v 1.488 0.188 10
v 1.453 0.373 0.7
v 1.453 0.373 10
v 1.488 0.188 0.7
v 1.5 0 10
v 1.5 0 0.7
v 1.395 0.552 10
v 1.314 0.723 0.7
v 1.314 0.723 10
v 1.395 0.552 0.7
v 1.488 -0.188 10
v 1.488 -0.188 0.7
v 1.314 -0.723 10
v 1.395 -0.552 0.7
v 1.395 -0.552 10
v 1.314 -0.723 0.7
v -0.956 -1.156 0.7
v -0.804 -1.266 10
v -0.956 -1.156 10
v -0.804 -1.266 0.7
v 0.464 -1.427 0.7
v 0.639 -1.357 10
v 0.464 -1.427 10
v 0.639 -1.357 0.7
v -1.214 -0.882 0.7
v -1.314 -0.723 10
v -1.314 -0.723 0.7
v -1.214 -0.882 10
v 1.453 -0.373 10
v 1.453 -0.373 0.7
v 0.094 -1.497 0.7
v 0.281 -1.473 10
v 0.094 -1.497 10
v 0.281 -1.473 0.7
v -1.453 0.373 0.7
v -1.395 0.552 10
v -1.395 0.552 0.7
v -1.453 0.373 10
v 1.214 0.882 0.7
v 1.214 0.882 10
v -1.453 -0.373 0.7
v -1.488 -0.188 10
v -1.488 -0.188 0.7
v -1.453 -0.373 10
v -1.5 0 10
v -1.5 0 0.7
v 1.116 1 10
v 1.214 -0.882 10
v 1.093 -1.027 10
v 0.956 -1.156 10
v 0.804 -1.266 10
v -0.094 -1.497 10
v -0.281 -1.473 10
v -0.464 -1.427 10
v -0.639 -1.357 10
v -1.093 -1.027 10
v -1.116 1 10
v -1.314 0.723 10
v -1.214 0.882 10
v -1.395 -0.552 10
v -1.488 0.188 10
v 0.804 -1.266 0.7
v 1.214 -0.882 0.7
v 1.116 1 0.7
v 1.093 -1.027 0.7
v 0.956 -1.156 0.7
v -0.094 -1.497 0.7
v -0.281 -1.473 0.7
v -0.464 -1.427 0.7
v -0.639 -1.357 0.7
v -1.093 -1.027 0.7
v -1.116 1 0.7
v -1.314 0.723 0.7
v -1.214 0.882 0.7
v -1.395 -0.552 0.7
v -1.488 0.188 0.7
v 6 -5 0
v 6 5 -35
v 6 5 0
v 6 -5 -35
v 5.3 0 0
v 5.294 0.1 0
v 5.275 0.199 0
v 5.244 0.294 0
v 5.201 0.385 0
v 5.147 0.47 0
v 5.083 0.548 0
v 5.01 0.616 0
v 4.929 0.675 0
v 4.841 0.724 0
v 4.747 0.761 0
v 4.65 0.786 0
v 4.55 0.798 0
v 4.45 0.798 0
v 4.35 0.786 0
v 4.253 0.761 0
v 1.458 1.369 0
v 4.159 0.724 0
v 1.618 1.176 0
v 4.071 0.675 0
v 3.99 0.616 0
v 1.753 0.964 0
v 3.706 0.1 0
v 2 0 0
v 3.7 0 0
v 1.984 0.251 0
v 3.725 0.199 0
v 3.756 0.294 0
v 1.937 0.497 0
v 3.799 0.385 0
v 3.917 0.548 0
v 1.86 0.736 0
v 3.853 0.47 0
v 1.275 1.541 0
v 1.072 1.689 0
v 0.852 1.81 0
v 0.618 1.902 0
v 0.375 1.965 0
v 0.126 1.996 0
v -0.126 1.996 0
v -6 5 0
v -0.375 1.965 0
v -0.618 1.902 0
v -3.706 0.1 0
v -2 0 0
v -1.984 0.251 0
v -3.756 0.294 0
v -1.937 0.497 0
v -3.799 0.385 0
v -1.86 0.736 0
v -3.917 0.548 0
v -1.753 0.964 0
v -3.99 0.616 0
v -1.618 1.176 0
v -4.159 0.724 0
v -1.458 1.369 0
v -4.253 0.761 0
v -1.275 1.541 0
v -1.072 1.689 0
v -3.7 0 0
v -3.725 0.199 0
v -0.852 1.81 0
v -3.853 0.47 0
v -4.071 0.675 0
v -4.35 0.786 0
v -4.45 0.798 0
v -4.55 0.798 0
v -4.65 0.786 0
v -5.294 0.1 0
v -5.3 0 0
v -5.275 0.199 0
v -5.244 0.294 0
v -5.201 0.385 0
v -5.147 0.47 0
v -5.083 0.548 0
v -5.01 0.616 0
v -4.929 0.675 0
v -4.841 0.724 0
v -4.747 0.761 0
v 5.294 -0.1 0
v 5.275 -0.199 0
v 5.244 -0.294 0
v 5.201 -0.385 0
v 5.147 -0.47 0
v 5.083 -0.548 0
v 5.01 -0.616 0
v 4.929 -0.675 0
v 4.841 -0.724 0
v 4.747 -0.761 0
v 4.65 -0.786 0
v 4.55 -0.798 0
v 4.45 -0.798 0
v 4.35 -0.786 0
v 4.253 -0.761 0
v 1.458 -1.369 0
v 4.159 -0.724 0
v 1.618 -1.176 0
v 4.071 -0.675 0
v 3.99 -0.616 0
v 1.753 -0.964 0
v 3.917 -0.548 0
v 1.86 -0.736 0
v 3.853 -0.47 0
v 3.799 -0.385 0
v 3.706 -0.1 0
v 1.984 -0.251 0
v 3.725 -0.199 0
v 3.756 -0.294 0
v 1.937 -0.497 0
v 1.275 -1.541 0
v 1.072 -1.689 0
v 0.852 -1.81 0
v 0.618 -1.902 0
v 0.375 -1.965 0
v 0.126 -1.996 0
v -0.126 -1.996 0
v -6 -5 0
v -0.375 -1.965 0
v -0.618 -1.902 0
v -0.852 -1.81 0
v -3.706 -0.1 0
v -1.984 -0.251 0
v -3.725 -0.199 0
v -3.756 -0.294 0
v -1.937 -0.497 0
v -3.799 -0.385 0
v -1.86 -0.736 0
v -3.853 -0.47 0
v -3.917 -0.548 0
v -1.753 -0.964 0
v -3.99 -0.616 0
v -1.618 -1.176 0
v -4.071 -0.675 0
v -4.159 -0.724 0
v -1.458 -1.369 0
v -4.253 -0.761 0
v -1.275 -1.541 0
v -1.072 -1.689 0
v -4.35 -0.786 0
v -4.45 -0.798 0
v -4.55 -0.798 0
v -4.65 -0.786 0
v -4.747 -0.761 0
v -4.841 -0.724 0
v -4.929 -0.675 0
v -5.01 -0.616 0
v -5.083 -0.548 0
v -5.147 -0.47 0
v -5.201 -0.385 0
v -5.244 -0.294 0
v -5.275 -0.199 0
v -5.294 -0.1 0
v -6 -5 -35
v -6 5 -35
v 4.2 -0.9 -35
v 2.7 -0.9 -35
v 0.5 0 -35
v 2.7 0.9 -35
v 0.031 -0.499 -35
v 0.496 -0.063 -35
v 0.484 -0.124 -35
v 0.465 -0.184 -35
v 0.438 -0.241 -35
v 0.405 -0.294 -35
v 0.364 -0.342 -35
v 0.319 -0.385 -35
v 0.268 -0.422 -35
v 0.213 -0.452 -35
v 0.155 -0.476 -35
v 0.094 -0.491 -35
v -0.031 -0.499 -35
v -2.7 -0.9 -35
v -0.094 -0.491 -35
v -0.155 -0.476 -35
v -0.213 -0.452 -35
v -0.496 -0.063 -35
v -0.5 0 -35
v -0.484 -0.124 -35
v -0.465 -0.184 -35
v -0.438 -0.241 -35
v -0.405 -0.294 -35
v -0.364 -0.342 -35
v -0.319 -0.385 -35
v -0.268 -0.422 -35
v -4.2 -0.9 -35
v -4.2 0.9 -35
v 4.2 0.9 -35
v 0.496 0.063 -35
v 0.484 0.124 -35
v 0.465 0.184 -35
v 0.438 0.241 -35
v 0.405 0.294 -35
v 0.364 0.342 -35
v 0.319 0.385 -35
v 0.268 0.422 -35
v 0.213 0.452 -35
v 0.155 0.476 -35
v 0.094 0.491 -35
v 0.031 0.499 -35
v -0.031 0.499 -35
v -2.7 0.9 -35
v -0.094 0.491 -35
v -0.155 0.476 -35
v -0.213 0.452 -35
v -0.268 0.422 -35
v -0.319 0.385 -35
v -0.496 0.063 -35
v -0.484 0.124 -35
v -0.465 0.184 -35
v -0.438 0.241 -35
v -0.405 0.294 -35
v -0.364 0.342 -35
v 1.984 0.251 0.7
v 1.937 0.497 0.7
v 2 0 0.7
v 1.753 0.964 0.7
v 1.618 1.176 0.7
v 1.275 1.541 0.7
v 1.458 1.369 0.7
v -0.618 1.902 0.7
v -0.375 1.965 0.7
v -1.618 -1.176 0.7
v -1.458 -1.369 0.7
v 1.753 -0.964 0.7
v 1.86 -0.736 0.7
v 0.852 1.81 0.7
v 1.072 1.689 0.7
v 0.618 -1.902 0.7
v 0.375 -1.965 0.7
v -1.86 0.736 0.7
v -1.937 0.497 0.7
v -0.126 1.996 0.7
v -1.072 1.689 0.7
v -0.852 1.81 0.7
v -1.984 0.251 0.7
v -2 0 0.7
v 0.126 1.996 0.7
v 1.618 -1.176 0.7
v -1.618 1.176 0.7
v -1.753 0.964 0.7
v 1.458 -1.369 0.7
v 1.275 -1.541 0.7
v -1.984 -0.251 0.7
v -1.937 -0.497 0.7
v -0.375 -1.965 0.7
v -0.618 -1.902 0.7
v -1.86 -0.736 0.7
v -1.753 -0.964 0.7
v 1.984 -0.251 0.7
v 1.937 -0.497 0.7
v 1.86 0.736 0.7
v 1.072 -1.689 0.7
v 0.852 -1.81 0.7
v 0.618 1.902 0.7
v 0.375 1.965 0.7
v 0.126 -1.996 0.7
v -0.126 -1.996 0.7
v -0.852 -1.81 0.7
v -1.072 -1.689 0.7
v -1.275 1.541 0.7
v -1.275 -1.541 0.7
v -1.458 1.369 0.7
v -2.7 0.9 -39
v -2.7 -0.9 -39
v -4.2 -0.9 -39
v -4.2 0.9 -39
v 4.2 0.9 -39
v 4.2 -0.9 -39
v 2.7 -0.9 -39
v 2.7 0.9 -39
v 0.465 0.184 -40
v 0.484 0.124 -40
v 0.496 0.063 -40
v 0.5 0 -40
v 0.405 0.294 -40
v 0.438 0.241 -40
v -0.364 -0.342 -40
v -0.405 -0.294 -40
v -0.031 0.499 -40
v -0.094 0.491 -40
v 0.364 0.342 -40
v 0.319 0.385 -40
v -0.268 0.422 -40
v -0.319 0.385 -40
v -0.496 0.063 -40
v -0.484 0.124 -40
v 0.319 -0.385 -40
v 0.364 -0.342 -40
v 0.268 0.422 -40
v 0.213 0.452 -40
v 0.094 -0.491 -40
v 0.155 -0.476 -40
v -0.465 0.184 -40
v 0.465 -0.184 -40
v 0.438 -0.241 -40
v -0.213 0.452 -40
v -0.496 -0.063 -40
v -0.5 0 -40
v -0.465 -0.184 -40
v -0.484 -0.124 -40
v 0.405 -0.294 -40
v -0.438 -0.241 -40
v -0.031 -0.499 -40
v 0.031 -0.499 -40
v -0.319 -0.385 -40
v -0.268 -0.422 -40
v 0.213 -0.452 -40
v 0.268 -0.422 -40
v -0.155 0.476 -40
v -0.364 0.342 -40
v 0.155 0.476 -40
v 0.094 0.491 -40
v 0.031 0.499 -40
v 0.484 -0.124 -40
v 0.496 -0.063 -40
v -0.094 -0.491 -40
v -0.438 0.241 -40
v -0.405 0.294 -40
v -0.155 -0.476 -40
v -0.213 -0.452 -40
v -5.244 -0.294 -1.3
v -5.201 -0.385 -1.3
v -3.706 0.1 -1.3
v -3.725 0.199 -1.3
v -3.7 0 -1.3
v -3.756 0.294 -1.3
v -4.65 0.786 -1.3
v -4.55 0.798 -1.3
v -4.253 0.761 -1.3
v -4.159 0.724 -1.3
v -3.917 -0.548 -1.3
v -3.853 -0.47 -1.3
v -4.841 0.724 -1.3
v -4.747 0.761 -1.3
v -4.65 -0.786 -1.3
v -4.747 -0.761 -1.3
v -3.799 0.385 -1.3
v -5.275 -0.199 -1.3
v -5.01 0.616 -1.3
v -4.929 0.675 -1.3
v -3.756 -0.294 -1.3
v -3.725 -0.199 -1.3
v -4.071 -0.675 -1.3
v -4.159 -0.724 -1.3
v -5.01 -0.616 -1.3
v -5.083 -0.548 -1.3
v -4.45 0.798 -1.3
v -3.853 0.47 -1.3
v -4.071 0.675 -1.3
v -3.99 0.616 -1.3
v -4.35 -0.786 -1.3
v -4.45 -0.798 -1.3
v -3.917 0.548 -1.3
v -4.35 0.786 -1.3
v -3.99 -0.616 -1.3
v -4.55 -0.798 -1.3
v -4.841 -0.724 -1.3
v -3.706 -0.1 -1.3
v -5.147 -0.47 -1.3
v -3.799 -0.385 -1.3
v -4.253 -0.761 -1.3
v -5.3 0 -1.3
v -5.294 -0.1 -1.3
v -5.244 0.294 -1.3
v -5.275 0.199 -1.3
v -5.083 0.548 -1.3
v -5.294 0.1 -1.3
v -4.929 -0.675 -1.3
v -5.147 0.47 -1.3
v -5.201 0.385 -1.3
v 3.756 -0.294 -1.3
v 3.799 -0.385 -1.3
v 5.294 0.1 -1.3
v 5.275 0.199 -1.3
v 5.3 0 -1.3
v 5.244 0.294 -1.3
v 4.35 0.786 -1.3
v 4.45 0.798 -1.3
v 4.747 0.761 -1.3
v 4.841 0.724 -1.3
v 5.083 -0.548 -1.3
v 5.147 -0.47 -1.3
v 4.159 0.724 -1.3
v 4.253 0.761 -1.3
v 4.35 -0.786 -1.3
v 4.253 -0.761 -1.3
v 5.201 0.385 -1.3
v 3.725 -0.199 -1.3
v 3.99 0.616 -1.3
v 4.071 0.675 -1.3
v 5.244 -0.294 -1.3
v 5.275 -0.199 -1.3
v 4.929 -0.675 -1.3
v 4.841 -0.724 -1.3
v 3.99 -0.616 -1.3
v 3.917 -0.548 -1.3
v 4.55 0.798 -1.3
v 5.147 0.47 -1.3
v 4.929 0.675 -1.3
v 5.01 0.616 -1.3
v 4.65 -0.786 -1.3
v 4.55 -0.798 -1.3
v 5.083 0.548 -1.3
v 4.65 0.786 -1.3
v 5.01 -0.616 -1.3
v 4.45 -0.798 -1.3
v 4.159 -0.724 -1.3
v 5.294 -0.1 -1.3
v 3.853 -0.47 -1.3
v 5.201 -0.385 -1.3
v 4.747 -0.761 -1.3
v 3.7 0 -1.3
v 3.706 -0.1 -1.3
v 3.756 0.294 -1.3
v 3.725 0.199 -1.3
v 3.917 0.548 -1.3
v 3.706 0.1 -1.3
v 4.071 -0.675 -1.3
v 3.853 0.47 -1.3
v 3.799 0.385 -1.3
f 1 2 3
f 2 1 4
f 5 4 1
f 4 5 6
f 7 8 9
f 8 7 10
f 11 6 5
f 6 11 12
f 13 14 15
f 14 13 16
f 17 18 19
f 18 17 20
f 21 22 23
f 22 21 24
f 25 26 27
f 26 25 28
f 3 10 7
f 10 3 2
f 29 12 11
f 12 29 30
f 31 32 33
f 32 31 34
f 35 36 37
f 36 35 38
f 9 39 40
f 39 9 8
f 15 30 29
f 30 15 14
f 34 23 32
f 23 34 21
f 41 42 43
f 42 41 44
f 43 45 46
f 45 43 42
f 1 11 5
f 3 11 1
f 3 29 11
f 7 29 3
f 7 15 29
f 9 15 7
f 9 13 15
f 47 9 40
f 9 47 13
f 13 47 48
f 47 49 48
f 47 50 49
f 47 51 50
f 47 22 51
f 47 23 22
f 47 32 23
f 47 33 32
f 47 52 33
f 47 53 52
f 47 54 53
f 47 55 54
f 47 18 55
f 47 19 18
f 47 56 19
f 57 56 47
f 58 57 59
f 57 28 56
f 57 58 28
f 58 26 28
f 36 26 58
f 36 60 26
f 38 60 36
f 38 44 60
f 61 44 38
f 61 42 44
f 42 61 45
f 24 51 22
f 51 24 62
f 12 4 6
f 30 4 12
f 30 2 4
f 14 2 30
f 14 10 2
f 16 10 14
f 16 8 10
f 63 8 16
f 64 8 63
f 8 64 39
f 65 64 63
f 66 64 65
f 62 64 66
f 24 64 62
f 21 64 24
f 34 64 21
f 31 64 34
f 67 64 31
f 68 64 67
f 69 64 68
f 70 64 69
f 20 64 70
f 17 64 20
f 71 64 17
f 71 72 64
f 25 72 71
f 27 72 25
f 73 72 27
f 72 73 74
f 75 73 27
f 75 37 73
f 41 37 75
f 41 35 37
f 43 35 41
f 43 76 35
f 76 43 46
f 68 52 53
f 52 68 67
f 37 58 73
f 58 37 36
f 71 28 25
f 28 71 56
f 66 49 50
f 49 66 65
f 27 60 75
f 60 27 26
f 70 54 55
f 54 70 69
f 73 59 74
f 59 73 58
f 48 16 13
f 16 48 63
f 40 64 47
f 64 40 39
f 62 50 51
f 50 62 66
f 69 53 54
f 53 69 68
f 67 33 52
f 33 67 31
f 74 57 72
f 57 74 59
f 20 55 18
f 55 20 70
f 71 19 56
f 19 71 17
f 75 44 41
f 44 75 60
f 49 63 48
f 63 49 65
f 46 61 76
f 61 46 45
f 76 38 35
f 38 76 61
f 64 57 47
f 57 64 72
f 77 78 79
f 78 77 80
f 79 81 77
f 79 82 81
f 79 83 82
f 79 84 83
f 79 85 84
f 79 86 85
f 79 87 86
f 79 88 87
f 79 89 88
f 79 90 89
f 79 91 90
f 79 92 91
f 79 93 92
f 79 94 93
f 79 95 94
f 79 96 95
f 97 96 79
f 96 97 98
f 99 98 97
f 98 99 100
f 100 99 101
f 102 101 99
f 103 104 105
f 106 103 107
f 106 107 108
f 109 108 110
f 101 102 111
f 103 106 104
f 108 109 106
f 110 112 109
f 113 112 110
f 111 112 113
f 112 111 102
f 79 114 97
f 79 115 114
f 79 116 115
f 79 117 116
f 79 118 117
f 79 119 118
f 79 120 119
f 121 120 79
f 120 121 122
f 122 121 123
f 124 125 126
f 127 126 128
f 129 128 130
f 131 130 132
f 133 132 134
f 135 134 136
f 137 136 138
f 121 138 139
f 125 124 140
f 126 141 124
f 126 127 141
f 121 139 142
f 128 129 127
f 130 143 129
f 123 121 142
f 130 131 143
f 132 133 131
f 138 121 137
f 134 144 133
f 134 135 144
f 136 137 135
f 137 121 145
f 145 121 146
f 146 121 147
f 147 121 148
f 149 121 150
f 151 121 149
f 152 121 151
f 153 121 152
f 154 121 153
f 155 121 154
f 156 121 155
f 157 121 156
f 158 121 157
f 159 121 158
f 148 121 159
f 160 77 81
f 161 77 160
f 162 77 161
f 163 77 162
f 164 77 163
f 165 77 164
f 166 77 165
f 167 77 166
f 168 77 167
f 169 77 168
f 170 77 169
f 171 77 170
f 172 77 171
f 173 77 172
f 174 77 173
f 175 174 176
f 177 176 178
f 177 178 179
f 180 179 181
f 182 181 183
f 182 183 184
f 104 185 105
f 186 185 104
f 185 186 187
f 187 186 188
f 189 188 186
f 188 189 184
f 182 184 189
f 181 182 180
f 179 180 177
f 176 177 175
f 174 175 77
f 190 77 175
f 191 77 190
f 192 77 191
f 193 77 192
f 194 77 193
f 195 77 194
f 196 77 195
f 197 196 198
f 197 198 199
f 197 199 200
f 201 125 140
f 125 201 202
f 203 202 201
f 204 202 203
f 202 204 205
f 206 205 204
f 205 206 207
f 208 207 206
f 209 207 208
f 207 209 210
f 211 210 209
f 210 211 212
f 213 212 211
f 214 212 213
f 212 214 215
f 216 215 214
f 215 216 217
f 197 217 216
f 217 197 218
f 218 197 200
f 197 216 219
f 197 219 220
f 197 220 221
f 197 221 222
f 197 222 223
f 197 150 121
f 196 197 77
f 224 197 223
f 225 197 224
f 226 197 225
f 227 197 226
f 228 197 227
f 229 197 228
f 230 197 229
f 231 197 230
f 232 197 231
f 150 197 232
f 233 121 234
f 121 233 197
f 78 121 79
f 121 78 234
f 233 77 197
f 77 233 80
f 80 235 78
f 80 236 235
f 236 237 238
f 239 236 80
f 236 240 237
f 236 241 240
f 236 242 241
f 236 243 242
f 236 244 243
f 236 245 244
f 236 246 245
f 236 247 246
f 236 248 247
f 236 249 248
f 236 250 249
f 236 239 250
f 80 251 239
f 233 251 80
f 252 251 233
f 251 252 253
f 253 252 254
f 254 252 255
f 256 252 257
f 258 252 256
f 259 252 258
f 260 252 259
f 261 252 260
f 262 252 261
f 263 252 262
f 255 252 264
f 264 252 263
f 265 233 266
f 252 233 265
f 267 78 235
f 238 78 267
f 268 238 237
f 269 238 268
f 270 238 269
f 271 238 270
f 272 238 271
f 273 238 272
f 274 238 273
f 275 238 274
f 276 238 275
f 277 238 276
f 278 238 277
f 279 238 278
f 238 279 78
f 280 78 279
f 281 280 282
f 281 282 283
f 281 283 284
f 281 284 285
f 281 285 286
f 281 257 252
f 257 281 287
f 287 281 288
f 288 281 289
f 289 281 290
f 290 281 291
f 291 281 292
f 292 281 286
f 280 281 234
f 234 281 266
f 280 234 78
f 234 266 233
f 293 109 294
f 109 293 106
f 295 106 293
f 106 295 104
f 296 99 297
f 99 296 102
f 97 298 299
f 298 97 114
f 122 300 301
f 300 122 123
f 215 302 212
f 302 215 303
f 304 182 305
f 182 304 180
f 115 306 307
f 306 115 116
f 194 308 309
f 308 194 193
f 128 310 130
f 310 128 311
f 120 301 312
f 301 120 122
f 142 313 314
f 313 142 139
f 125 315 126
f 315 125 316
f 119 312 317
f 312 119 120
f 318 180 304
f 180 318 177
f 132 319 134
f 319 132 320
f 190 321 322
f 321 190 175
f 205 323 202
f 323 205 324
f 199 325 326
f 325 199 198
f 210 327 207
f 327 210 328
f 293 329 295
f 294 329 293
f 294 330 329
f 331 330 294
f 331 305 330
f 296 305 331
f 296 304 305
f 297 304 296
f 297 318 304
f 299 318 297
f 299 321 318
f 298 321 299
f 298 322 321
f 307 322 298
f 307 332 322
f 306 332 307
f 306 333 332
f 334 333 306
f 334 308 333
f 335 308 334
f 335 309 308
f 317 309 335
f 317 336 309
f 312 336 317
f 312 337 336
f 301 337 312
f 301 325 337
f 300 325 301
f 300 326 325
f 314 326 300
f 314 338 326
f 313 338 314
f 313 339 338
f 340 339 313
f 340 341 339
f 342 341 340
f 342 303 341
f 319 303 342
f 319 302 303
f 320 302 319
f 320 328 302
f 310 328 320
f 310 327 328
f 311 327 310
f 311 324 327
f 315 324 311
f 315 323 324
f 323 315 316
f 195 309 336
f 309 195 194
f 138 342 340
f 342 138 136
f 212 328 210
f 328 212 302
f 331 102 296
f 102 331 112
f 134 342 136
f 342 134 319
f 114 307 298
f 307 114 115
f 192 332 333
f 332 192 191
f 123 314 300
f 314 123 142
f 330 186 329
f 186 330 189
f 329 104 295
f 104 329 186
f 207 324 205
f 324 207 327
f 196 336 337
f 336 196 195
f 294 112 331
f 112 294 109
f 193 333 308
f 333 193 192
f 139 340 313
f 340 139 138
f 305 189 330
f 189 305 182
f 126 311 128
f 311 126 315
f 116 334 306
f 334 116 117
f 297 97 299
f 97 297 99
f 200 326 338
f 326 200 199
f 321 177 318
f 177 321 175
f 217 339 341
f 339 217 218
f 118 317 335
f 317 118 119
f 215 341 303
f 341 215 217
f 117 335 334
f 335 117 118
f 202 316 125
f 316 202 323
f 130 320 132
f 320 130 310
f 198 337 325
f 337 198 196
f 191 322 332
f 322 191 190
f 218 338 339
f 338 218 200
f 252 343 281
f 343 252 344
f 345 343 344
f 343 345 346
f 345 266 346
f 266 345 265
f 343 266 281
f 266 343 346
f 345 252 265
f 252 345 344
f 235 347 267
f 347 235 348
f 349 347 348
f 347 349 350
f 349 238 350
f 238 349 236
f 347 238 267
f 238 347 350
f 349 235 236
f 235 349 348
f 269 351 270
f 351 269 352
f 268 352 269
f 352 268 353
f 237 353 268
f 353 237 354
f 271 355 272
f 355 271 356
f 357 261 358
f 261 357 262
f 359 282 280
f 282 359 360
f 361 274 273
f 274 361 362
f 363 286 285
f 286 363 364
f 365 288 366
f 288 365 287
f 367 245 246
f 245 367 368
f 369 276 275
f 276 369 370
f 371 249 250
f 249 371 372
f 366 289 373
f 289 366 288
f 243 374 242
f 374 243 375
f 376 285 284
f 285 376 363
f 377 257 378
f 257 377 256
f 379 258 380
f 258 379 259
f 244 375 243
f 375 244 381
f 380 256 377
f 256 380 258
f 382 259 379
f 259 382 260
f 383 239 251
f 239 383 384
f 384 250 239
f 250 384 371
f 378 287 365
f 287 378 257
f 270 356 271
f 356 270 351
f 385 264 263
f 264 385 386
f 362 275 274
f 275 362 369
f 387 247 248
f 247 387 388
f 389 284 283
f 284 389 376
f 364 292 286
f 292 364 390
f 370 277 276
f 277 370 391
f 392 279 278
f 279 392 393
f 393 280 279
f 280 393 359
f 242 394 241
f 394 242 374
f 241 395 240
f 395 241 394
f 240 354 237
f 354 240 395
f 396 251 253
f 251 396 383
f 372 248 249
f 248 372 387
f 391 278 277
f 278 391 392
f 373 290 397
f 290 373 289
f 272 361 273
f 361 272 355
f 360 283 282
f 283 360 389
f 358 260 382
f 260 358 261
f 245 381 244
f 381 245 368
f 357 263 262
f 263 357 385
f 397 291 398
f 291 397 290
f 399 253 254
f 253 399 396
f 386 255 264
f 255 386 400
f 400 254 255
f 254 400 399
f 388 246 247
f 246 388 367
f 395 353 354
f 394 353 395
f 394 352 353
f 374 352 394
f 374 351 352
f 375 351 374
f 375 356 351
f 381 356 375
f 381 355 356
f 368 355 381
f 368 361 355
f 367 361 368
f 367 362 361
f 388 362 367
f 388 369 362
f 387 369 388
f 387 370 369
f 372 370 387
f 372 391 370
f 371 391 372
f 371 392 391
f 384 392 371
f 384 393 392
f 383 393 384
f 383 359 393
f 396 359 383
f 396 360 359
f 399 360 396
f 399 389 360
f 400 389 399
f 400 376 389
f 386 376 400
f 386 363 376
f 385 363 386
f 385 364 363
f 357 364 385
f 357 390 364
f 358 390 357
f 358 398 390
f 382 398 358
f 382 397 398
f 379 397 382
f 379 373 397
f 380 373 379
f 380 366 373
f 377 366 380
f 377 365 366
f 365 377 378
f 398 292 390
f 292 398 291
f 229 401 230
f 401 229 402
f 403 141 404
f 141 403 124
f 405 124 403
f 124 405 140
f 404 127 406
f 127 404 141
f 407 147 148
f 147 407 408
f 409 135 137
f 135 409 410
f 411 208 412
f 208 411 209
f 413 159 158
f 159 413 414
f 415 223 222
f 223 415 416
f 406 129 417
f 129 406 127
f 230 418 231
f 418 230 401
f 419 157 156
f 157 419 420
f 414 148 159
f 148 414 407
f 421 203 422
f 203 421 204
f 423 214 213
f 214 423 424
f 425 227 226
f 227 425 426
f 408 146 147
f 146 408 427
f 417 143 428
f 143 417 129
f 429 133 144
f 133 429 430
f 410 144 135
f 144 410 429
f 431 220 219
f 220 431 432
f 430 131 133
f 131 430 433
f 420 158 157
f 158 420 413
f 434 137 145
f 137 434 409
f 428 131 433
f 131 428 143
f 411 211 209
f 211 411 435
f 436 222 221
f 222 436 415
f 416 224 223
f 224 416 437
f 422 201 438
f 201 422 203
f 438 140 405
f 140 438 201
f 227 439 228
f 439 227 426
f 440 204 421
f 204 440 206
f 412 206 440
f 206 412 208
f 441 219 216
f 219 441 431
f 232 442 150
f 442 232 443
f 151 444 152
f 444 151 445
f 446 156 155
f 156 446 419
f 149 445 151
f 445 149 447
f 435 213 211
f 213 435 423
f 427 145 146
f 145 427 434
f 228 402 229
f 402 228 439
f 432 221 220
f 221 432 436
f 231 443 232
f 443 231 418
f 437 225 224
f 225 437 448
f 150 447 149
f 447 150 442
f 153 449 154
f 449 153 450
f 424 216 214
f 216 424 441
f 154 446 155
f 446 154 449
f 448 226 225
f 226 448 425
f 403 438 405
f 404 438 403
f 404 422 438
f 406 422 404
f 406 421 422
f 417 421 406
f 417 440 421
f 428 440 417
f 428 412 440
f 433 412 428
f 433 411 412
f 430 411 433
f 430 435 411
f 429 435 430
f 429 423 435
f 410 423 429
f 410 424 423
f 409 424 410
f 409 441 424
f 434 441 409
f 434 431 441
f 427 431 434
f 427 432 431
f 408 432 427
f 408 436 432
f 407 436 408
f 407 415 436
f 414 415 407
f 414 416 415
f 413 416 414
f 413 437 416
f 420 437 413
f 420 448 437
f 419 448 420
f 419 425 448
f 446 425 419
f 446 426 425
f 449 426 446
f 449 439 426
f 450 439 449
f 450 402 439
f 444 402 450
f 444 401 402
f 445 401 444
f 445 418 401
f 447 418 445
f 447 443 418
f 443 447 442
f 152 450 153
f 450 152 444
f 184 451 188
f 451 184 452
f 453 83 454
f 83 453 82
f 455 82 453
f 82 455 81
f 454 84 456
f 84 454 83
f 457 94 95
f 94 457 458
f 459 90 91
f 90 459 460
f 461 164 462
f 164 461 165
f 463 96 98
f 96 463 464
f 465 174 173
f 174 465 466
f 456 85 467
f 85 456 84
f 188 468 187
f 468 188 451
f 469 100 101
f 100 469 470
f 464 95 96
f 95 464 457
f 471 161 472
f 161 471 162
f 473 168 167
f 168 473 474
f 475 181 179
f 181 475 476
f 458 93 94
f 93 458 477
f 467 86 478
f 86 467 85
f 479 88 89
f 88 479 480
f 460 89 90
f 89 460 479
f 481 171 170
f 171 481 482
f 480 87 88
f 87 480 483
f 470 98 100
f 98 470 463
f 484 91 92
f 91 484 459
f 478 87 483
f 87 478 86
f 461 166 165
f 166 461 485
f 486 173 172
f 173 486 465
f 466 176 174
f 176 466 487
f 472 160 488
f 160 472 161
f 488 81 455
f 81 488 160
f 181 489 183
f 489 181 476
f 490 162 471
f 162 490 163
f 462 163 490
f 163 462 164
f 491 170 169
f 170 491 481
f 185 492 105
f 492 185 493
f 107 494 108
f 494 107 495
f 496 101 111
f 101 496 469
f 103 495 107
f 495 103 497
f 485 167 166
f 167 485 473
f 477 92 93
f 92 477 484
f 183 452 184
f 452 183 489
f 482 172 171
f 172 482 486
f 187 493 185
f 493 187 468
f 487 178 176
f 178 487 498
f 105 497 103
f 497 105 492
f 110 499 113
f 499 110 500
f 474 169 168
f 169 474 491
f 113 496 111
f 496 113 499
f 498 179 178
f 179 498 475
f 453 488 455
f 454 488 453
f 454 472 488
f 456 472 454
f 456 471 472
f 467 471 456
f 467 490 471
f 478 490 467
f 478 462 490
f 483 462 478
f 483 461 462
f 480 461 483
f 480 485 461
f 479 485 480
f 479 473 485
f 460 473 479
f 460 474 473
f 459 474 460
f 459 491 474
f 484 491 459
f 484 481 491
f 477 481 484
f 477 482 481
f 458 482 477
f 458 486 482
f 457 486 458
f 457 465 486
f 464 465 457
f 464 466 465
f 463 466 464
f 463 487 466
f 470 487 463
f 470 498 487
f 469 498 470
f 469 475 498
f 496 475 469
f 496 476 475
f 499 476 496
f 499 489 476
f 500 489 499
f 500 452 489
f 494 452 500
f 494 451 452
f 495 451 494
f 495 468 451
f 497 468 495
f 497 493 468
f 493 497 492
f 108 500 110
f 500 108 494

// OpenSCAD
$fn = 50;

difference() {
	union() {
		translate(v = [0, 0, 0.7]) {
			rotate(a = [0, 0, 0]) {
				difference() {
					union() {
						cylinder(h = 9.3, r = 1.5);
					}
					union() {
						translate(v = [-6.0, 1.0, -1]) {
							cube(size = [12, 12, 11.3]);
						}
					}
				}
			}
		}
		translate(v = [-6.0, -5.0, -9]) {
			cube(size = [12, 10, 9]);
		}
		translate(v = [-6.0, -5.0, -35]) {
			cube(size = [12, 10, 26]);
		}
		cylinder(h = 0.7, r = 2.0);
		translate(v = [-4.2, -0.9, -39]) {
			cube(size = [1.5, 1.8, 4]);
		}
		translate(v = [2.7, -0.9, -39]) {
			cube(size = [1.5, 1.8, 4]);
		}
		translate(v = [0, 0, -40.0]) {
			cylinder(h = 5, r = 0.5);
		}
	}
	union() {
		translate(v = [-4.5, 0, -1.3]) {
			cylinder(h = 1.31, r = 0.8);
		}
		translate(v = [4.5, 0, -1.3]) {
			cylinder(h = 1.31, r = 0.8);
		}
	}
}
